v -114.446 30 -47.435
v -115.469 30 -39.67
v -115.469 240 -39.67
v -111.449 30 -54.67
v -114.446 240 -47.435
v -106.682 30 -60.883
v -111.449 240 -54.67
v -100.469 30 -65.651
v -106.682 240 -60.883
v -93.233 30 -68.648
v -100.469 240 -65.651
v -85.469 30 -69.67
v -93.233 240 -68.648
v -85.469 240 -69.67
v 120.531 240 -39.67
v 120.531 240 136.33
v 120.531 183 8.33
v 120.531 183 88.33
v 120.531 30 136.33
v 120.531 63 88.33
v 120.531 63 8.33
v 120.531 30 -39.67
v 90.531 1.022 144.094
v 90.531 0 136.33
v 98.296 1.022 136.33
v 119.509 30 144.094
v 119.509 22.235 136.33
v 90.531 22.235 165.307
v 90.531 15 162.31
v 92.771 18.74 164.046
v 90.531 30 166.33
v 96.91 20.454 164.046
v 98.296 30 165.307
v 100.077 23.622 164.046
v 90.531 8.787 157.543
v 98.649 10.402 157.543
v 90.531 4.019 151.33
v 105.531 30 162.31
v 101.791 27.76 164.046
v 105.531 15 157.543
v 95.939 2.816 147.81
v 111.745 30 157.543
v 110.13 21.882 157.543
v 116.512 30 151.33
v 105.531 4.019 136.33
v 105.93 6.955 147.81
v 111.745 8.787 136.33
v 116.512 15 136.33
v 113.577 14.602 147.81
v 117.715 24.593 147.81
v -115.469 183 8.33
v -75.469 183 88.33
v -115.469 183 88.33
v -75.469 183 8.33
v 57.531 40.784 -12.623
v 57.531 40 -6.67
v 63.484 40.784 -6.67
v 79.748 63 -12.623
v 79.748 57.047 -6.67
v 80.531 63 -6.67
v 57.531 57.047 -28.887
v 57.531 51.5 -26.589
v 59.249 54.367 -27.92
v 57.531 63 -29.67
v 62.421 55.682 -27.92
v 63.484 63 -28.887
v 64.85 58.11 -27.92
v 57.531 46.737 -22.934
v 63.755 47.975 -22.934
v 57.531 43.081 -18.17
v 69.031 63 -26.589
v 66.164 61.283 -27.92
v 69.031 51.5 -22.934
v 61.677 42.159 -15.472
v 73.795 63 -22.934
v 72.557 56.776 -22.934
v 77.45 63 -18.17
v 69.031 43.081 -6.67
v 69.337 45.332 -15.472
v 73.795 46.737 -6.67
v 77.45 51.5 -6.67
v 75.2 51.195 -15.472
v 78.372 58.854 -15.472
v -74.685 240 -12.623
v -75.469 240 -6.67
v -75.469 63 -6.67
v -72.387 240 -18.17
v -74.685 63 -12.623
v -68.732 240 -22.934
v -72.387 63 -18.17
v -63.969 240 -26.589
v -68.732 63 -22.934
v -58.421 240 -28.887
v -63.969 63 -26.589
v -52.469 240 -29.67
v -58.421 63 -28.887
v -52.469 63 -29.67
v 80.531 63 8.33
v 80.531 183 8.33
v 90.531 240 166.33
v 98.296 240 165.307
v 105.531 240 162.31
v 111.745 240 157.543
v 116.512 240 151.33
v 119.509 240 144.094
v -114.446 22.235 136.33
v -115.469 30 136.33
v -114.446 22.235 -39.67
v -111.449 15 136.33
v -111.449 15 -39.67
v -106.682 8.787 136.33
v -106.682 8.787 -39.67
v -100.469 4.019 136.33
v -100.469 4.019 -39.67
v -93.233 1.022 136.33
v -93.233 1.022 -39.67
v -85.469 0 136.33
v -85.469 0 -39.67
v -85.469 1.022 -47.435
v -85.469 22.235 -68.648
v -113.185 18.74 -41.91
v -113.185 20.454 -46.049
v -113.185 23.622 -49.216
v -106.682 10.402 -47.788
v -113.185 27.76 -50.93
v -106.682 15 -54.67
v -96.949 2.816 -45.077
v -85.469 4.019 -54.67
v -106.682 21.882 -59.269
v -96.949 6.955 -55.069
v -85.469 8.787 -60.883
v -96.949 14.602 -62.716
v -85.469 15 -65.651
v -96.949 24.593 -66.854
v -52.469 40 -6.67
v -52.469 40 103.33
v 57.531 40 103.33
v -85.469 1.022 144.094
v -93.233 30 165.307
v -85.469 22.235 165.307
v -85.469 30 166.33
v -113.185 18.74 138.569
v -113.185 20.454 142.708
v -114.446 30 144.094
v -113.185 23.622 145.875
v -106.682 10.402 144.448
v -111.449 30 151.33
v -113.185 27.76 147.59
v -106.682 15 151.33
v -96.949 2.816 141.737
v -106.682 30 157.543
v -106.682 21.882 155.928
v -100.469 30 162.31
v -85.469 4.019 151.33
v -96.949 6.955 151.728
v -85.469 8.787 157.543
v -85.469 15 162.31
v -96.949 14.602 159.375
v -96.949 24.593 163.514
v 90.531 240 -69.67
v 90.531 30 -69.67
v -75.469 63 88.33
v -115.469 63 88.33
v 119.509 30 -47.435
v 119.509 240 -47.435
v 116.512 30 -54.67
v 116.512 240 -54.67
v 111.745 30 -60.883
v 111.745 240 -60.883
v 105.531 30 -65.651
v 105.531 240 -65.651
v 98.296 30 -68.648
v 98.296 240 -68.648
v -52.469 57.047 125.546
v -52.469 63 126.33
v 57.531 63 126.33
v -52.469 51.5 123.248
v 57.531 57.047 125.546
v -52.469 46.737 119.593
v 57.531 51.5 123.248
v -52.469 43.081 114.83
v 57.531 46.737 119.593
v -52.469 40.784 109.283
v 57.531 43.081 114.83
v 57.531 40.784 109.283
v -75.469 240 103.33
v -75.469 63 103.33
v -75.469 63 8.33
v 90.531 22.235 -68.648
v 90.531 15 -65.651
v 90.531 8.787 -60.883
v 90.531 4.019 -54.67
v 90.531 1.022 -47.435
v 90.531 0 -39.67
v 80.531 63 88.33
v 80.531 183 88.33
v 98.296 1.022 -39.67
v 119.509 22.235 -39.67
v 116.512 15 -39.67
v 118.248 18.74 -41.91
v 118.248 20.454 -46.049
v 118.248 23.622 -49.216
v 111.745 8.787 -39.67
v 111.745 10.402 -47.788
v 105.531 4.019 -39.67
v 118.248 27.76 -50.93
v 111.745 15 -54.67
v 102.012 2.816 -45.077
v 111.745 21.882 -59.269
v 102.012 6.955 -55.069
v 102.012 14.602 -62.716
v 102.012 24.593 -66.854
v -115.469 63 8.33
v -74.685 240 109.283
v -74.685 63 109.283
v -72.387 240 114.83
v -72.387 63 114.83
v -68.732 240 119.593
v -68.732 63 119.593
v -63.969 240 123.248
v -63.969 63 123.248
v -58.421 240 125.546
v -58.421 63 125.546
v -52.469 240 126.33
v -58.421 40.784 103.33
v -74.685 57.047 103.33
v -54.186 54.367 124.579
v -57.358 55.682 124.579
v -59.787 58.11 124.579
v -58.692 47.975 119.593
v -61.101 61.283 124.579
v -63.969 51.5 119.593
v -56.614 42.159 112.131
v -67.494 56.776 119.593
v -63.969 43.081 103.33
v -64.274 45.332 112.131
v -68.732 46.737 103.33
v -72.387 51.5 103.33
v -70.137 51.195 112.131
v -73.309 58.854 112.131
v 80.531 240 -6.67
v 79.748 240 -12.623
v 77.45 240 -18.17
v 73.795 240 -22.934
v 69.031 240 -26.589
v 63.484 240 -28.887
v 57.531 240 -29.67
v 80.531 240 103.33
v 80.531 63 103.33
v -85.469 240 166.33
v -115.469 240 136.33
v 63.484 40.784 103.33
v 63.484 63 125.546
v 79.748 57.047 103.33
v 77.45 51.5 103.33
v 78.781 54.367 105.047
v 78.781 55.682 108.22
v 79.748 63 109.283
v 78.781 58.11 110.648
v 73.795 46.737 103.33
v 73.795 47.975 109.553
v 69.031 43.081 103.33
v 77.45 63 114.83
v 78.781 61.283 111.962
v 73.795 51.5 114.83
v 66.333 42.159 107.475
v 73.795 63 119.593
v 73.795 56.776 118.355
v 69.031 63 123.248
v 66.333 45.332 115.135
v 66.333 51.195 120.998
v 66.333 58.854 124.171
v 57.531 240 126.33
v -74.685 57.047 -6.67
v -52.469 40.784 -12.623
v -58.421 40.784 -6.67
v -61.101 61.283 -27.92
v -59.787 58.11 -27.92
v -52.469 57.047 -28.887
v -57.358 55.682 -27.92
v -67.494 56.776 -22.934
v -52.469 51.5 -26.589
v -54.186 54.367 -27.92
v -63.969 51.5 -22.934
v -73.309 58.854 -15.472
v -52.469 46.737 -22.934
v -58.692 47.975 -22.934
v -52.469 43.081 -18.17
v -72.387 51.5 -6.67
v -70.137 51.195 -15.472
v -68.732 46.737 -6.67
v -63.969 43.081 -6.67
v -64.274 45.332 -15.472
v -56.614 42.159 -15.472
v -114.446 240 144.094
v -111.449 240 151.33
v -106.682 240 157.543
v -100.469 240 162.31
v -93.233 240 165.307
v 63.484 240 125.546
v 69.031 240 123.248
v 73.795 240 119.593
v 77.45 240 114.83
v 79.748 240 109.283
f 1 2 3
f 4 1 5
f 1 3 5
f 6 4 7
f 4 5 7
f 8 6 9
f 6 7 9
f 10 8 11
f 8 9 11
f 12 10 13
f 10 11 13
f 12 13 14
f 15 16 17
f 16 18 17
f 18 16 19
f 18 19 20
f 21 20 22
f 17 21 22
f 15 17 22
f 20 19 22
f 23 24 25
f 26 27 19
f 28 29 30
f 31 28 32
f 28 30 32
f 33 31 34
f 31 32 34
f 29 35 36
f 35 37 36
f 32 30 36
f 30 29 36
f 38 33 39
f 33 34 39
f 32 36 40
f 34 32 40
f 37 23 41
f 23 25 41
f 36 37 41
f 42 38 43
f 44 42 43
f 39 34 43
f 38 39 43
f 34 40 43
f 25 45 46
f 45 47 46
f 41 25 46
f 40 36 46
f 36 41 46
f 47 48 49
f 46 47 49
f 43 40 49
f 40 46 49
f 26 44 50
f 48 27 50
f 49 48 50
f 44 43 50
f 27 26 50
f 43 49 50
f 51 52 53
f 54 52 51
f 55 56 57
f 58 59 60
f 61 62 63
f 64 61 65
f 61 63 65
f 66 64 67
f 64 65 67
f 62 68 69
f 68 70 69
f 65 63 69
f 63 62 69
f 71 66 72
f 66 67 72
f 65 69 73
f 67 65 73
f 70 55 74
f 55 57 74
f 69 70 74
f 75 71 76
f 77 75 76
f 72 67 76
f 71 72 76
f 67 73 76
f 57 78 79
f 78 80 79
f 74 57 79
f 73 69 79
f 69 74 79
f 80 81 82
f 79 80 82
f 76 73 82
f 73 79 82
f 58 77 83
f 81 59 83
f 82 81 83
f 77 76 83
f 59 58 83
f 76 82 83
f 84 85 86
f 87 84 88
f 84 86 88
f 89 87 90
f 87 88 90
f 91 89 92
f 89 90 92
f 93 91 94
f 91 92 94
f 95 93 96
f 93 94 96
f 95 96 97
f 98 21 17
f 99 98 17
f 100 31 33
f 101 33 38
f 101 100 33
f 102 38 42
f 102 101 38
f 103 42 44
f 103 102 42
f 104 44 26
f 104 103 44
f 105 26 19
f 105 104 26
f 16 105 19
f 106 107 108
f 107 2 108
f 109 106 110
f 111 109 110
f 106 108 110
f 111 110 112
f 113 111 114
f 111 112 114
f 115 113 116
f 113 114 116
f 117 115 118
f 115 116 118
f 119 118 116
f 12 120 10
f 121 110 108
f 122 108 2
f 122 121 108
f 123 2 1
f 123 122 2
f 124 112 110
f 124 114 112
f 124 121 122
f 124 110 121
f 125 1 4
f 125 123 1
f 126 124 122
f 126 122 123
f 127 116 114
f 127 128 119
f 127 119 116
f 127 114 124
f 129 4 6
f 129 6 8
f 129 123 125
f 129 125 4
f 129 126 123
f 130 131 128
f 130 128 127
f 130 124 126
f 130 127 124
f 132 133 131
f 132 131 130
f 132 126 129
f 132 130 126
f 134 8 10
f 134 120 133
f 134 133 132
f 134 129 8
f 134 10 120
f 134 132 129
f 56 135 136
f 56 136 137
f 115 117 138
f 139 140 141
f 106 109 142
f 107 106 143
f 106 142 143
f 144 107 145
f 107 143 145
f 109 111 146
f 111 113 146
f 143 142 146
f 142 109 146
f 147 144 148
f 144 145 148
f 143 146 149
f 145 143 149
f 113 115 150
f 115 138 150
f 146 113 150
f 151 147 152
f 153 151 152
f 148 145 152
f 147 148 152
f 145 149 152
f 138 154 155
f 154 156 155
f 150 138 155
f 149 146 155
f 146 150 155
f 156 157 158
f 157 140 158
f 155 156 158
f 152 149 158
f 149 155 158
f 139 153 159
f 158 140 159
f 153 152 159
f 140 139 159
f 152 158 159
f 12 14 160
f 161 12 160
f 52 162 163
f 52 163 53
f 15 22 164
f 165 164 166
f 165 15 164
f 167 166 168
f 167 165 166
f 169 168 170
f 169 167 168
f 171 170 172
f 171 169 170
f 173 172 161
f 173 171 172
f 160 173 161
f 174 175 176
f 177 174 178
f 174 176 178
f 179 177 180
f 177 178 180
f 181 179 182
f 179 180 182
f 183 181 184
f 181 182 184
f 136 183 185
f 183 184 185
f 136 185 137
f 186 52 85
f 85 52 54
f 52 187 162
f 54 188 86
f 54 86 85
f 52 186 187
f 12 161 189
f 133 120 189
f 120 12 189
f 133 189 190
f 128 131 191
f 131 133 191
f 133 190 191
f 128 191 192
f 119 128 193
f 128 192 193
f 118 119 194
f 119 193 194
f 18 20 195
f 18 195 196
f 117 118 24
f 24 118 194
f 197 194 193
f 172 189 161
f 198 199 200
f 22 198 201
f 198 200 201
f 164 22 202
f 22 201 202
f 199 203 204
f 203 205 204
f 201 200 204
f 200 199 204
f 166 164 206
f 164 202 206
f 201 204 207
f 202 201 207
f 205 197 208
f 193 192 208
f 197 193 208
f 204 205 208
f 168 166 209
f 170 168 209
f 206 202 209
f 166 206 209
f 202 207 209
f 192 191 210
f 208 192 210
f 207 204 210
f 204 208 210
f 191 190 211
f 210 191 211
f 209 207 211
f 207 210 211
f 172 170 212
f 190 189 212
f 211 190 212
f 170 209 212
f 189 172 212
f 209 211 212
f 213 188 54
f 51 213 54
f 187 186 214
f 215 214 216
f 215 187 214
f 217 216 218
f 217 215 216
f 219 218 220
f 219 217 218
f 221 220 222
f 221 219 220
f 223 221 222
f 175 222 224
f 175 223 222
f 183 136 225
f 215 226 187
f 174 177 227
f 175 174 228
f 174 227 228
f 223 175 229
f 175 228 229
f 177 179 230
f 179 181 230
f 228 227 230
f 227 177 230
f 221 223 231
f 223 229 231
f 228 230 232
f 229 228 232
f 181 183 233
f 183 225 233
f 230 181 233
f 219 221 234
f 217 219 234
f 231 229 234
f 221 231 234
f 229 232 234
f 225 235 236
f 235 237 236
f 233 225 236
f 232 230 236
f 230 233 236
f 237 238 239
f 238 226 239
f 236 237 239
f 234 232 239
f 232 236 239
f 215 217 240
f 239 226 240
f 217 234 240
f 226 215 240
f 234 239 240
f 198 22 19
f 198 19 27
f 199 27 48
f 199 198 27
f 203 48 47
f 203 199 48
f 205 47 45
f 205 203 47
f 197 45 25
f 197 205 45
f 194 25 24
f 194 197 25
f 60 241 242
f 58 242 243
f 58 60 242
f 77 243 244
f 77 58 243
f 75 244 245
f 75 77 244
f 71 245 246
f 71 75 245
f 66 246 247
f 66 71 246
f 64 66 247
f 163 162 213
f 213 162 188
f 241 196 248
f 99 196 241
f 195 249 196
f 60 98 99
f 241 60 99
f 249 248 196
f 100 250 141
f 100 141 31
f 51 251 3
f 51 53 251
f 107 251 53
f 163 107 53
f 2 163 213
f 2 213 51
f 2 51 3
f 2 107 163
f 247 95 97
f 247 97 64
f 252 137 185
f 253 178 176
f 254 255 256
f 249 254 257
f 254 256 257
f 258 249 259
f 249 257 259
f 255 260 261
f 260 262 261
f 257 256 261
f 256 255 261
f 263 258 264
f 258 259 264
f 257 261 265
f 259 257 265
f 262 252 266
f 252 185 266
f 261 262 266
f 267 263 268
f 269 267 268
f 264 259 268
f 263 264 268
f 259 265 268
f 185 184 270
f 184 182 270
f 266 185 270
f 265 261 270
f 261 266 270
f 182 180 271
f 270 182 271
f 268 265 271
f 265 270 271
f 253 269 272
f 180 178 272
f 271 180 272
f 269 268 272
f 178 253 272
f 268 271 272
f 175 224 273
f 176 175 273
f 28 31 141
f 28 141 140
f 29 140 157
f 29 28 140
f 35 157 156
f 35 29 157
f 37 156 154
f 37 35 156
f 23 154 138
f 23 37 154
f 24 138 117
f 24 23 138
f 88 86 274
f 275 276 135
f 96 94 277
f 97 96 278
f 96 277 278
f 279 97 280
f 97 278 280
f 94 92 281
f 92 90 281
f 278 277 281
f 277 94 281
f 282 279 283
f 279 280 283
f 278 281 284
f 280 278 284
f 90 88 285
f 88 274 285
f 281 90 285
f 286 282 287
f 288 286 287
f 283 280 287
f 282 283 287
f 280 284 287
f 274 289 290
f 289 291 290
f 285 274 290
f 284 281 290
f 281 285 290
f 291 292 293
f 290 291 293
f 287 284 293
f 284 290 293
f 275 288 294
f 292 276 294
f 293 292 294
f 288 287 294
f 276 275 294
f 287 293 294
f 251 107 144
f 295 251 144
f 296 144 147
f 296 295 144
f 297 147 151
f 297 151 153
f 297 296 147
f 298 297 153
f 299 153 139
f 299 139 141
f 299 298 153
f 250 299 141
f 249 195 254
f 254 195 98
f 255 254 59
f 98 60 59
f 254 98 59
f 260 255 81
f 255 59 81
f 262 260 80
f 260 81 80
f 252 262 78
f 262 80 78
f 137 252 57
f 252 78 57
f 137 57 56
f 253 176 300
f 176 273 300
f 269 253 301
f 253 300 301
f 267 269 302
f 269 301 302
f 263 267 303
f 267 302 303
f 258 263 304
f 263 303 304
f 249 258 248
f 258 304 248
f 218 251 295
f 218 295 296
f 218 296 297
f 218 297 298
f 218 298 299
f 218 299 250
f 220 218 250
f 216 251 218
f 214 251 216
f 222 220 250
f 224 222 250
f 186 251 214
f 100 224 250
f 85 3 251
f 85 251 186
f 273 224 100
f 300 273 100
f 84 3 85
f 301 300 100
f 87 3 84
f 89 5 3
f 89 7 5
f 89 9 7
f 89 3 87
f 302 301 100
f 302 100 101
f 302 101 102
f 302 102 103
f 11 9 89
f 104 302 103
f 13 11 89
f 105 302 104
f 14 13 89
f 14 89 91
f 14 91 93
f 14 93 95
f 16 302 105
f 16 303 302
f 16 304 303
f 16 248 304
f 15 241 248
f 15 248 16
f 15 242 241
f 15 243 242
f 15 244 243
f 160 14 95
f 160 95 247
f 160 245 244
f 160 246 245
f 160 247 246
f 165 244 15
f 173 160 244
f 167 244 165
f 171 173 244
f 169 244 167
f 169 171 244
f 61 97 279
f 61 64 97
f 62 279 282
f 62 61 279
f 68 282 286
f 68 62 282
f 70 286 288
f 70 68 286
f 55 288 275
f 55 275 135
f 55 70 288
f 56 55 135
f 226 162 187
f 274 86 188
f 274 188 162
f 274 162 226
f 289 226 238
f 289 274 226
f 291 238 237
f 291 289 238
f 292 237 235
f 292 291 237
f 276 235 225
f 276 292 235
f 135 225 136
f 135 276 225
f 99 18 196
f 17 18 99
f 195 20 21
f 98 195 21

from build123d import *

# Parameters (mm, degrees)
SKETCH1_W           = 236
SKETCH1_H           = 236
BOSS_EXTRUDE1_DEPTH = 240
SHELL1_T            = -40
FILLET1_R           = 23
FILLET2_R           = 30
SKETCH3_W           = 80
SKETCH3_H           = 120
CUT_EXTRUDE2_DEPTH  = 240


with BuildPart() as part:
    # Sketch1 → Boss-Extrude1 (new body)
    with BuildSketch(Plane(origin=(0, 0, 0), x_dir=(1, 0, 0), z_dir=(0, 1, 0))):
        with Locations((2.531496063, -48.329724409)):
            Rectangle(SKETCH1_W, SKETCH1_H)
    extrude(amount=BOSS_EXTRUDE1_DEPTH)

    # Shell1
    shell1_openings = [part.faces().sort_by_distance(p)[0] for p in [
        (2.531496063, 240, 48.329724409),
    ]]
    offset(amount=SHELL1_T, openings=shell1_openings, kind=Kind.INTERSECTION)

    # Fillet1
    fillet1_edges = [part.edges().sort_by_distance(p)[0] for p in [
        (-75.468503937, 40, 48.329724409),
        (-75.468503937, 140, -29.670275591),
        (2.531496063, 40, 126.329724409),
        (-75.468503937, 140, 126.329724409),
        (80.531496063, 40, 48.329724409),
        (80.531496063, 140, 126.329724409),
        (2.531496063, 40, -29.670275591),
        (80.531496063, 140, -29.670275591),
    ]]
    fillet(fillet1_edges, radius=FILLET1_R)

    # Fillet2
    fillet2_edges = [part.edges().sort_by_distance(p)[0] for p in [
        (2.531496063, 0, -69.670275591),
        (120.531496063, 0, 48.329724409),
        (2.531496063, 0, 166.329724409),
        (-115.468503937, 0, 48.329724409),
        (-115.468503937, 120, -69.670275591),
        (120.531496063, 120, -69.670275591),
        (120.531496063, 120, 166.329724409),
        (-115.468503937, 120, 166.329724409),
    ]]
    fillet(fillet2_edges, radius=FILLET2_R)

    # Sketch3 → Cut-Extrude2 (cut)
    with BuildSketch(Plane(origin=(120.531496063, 0, 0), x_dir=(0, 0, -1), z_dir=(1, 0, 0))):
        with Locations((-48.329724409, 123)):
            Rectangle(SKETCH3_W, SKETCH3_H)
    extrude(amount=-CUT_EXTRUDE2_DEPTH, mode=Mode.SUBTRACT)


solid = part.part
